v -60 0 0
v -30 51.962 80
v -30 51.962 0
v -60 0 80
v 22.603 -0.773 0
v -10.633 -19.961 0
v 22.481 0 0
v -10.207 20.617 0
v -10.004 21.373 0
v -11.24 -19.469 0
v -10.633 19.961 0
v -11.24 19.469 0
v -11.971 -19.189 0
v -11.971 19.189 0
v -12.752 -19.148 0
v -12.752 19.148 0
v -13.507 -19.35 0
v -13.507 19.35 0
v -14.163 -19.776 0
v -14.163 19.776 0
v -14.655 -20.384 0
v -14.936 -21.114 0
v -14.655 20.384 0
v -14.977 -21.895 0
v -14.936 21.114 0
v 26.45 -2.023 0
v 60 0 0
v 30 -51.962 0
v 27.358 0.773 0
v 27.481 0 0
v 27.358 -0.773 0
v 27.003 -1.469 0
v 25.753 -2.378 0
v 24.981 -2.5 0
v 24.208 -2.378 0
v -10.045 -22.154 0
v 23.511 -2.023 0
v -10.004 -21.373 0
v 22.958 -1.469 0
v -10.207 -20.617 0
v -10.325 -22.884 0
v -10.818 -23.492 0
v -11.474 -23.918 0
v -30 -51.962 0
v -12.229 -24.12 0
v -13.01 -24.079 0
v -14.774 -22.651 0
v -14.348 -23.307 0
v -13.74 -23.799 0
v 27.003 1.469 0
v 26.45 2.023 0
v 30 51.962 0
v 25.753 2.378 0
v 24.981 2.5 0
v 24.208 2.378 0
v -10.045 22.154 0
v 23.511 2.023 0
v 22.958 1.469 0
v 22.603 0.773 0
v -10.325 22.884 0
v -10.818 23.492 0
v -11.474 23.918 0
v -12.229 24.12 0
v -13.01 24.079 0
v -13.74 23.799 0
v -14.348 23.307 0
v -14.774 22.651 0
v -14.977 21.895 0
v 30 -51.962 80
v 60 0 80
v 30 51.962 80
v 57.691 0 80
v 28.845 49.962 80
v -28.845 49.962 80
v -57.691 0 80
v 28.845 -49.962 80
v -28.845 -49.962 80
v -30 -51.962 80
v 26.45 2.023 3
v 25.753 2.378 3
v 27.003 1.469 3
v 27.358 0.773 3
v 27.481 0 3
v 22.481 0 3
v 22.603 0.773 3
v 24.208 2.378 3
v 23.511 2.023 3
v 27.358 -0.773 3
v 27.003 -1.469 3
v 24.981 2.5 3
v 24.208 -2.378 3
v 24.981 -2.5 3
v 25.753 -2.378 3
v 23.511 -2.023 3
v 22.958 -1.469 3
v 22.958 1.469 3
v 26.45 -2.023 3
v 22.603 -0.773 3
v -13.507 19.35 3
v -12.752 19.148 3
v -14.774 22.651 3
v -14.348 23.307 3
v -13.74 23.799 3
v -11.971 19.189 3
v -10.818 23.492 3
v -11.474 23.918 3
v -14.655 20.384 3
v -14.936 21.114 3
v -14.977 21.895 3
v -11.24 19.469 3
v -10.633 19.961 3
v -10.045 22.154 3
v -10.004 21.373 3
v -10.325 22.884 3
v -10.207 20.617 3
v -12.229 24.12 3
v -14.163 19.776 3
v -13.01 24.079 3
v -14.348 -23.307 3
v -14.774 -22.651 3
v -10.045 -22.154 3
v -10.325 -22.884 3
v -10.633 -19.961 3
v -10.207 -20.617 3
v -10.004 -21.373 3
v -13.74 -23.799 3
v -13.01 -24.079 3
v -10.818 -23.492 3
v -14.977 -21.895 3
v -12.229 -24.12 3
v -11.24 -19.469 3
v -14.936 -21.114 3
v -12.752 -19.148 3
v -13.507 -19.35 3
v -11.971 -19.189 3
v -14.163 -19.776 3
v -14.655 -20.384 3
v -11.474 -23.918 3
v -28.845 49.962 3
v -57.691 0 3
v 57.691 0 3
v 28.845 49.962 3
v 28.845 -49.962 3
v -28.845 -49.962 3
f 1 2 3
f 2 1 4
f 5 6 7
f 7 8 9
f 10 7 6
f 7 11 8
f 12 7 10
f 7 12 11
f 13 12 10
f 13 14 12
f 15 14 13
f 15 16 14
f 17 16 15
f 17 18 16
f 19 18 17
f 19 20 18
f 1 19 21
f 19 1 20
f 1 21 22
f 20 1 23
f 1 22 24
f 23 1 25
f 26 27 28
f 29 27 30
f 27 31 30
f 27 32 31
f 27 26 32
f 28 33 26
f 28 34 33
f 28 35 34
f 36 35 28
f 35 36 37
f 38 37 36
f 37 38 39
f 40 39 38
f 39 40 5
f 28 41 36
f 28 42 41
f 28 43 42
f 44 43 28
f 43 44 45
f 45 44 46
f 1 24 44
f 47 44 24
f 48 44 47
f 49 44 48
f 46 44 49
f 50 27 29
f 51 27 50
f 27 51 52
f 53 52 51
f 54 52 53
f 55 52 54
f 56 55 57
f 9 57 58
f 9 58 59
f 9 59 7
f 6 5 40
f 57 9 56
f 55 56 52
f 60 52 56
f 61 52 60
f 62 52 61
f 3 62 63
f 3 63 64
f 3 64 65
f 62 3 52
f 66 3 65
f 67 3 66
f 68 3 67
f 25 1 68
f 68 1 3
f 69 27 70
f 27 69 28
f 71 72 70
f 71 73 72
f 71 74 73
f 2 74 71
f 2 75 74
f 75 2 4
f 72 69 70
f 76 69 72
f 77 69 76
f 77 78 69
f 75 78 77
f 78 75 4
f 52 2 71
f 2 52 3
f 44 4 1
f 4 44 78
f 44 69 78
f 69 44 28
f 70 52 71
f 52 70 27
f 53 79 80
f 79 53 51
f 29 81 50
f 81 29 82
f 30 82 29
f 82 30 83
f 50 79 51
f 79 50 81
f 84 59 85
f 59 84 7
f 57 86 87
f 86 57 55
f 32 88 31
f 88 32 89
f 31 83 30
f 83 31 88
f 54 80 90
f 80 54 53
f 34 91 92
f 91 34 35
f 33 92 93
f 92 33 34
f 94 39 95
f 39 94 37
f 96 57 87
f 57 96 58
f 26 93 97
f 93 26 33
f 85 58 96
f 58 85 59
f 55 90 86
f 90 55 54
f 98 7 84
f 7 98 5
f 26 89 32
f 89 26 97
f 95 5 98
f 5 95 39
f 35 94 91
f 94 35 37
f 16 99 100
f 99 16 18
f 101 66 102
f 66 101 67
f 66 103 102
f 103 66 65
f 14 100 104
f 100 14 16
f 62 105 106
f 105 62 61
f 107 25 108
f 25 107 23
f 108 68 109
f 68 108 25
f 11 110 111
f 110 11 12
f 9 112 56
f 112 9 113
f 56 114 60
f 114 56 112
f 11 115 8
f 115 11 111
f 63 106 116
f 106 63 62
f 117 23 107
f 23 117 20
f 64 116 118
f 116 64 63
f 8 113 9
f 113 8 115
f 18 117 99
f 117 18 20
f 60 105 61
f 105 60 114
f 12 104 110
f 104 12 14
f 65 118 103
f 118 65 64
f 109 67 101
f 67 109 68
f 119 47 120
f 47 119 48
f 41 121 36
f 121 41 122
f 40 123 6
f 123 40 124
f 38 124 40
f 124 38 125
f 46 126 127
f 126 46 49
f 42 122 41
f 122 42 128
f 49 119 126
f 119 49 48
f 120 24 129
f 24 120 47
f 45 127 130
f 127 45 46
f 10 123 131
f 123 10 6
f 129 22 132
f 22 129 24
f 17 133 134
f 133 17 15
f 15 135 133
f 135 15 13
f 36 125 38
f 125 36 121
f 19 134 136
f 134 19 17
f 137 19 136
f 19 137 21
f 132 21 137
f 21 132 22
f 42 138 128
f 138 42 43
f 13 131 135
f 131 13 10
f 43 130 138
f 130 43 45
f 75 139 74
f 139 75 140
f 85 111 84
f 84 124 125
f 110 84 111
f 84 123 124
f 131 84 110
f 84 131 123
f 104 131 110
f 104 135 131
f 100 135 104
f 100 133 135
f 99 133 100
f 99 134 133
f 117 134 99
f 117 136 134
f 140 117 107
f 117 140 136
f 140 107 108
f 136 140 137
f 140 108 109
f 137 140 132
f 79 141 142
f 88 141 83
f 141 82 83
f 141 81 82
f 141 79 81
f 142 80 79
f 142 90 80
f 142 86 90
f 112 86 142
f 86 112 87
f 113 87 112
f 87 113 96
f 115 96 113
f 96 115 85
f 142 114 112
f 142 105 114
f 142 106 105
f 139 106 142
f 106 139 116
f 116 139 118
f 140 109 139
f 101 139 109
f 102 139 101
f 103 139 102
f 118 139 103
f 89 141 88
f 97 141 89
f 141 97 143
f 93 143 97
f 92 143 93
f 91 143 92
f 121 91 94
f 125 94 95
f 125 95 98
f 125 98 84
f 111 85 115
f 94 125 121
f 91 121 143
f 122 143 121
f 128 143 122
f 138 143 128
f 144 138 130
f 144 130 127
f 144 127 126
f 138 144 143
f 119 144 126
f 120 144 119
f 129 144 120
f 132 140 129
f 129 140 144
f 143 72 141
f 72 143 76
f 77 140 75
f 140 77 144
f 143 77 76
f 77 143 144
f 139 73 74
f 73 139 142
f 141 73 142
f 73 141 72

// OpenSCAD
// Modular Hexagonal Planter - CORRECTED VERSION
// Fixes: Attached connectors, proper positioning

hex_size = 60;
height = 80;
wall_thickness = 2;
bottom_thickness = 3;
drainage_hole_d = 5;
connector_size = 4;

// Distance from center to flat face of hexagon
apothem = hex_size * sqrt(3) / 2;
inner_apothem = apothem - wall_thickness;

// CORRECTED planter with proper connectors
module planter_fixed() {
    difference() {
        union() {
            // Main hexagon body
            linear_extrude(height = height)
                hexagon(apothem);
            
            // Male dovetail connectors on 3 faces (properly attached)
            for (i = [0:2]) {
                rotate([0, 0, i * 120])
                    translate([apothem, 0, height * 0.5])
                        rotate([0, 90, 0])
                            dovetail_shape();
            }
        }
        
        // Inner cavity (hollow it out)
        translate([0, 0, bottom_thickness])
            linear_extrude(height = height - bottom_thickness + 1)
                hexagon(inner_apothem);
        
        // Drainage holes
        for (i = [0:2]) {
            rotate([0, 0, i * 120])
                translate([inner_apothem * 0.5, 0, -1])
                    cylinder(d = drainage_hole_d, h = bottom_thickness + 2, $fn=20);
        }
        
        // Female dovetail slots on other 3 faces
        for (i = [0:2]) {
            rotate([0, 0, i * 120 + 60])
                translate([apothem - wall_thickness/2, 0, height * 0.5])
                    rotate([0, 90, 0])
                        scale([1.1, 1.1, 1])  // Tolerance
                            dovetail_shape();
        }
    }
}

// Helper: hexagon with flat faces
module hexagon(r) {
    circle(r = r / cos(30), $fn = 6);
}

// Helper: dovetail connector shape
module dovetail_shape() {
    linear_extrude(height = 3, center = true)
        polygon([
            [-connector_size, -connector_size*0.7],
            [connector_size, -connector_size*0.7],
            [connector_size*0.6, connector_size*0.7],
            [-connector_size*0.6, connector_size*0.7]
        ]);
}

// Render it
planter_fixed();
